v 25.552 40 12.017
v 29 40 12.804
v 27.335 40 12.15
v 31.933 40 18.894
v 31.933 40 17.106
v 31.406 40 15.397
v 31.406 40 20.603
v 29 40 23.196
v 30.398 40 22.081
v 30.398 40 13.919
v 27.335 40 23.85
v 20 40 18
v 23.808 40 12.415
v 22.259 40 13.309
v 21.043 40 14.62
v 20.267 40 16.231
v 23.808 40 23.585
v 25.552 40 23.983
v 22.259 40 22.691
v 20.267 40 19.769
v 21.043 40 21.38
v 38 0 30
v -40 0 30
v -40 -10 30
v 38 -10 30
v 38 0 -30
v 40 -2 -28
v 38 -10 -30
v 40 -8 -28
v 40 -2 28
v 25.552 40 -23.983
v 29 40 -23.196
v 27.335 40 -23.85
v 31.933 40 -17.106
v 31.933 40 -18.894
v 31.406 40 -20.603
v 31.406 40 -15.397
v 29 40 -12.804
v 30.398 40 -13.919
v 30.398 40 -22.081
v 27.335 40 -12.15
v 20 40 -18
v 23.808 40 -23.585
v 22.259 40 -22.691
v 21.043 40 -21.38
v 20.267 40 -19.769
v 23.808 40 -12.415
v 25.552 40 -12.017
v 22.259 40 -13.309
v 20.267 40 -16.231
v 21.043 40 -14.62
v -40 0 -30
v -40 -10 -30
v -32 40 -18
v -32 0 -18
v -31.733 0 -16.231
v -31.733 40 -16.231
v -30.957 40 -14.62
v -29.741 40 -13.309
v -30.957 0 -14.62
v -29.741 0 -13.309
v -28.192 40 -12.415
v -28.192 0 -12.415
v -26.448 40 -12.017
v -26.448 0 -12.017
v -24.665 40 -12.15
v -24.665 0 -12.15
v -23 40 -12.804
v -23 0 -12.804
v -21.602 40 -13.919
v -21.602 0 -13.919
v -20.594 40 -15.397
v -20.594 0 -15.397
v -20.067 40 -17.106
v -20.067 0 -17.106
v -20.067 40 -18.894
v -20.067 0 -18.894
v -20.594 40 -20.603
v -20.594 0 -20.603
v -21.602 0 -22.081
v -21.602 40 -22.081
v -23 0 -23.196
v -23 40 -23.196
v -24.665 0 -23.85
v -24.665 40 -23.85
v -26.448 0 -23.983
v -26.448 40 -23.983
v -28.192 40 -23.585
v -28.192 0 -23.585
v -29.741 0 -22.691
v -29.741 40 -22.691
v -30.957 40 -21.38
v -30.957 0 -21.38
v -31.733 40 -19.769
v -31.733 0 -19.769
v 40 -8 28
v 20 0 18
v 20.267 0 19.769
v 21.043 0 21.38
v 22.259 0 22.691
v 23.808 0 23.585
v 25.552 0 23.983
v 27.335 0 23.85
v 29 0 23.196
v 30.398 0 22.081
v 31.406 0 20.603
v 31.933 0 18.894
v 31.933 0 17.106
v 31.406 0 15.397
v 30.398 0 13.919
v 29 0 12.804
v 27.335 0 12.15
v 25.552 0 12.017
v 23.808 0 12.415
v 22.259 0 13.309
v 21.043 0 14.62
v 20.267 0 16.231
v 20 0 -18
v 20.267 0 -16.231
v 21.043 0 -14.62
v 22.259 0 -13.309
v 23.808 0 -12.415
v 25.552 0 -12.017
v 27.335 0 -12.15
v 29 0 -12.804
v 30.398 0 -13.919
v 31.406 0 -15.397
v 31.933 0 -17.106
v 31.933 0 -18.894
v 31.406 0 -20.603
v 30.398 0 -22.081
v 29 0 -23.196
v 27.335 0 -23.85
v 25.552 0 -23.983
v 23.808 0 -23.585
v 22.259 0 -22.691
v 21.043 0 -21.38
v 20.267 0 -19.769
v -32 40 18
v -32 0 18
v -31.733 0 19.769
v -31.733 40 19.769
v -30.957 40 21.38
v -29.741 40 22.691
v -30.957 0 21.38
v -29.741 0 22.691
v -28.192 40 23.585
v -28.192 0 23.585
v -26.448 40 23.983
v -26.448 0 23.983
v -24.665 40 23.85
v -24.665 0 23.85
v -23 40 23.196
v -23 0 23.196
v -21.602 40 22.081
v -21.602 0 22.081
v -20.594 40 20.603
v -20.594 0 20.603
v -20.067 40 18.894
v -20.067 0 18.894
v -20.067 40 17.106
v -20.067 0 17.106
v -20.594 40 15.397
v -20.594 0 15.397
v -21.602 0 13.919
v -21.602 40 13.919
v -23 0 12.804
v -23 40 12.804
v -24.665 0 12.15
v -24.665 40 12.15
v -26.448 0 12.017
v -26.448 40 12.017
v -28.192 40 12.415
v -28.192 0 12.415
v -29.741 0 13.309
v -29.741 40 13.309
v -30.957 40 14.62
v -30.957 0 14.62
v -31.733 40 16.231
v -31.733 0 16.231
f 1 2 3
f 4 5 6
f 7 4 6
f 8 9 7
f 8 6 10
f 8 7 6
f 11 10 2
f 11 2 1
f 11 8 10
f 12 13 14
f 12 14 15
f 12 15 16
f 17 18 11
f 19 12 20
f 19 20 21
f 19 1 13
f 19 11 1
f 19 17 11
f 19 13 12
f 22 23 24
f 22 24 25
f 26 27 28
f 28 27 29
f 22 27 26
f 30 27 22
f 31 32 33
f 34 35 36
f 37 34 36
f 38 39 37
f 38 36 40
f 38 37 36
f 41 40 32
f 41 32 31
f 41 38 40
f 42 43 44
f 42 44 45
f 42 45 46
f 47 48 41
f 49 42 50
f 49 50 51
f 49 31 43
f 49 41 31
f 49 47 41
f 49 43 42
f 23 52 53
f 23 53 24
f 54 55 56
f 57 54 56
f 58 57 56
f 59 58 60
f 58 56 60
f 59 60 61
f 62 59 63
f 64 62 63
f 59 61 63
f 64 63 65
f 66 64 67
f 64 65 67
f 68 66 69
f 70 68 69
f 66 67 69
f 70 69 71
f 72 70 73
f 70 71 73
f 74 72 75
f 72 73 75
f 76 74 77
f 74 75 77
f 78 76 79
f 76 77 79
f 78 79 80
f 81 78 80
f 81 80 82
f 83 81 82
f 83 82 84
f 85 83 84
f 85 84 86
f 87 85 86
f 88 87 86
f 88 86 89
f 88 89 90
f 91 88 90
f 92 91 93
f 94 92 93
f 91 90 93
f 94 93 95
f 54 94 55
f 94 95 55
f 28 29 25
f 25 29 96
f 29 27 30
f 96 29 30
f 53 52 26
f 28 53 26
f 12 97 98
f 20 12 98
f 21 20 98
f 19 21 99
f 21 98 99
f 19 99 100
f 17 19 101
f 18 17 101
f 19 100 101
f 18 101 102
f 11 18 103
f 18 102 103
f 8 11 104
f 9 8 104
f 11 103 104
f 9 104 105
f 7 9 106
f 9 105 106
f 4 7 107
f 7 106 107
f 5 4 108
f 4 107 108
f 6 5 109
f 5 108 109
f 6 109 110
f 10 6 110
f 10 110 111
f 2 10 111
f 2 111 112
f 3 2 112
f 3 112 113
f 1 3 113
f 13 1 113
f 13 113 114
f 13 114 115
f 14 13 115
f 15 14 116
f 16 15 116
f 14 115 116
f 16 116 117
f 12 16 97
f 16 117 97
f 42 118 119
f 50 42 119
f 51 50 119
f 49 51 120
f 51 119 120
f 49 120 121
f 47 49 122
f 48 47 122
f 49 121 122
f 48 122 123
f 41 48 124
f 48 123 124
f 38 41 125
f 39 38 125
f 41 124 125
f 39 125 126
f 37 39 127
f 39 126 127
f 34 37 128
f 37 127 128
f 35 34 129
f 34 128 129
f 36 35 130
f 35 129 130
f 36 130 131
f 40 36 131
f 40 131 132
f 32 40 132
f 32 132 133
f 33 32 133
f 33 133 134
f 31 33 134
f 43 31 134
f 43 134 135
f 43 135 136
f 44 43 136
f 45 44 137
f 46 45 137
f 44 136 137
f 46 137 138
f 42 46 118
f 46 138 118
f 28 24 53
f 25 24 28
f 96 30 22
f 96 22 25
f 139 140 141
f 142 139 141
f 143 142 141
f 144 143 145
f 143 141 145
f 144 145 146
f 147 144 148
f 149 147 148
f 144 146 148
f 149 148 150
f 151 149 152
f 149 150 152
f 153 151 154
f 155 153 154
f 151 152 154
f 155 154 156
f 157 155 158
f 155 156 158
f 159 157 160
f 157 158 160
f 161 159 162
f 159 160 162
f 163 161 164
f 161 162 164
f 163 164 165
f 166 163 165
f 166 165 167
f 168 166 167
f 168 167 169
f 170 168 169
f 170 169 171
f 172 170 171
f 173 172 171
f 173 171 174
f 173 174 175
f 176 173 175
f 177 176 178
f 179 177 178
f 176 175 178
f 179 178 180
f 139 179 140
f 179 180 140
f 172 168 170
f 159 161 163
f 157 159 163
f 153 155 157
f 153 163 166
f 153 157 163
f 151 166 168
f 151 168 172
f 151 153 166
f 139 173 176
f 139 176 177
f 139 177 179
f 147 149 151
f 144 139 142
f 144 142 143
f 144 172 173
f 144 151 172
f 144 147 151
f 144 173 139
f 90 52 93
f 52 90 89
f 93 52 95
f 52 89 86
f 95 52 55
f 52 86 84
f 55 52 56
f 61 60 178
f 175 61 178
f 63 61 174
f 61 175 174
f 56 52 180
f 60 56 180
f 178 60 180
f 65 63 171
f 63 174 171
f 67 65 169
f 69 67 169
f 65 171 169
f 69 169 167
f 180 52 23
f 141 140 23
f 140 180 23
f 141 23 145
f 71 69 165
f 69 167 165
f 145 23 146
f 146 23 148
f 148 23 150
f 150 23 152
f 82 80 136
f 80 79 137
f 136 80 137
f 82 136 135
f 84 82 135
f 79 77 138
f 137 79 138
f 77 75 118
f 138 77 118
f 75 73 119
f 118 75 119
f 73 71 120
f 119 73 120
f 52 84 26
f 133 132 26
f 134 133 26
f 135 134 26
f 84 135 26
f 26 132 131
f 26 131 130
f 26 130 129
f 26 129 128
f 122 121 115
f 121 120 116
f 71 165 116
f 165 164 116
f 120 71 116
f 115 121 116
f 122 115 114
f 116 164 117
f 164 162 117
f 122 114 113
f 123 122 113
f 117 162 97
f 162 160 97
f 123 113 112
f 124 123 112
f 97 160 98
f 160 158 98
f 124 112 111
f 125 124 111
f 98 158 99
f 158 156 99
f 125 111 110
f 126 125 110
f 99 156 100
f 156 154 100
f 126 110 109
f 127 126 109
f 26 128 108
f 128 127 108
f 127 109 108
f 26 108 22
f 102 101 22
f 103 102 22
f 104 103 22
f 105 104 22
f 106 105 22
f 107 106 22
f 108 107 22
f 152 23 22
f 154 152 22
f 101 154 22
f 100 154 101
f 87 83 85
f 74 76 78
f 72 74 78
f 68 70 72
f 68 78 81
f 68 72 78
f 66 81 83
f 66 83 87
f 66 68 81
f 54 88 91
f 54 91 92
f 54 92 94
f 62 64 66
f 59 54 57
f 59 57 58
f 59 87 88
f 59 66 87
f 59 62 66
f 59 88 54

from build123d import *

# Parameters (mm, degrees)
F0_W     = 80
F0_H     = 60
F1_DEPTH = 10
F2_R     = 6
F3_DEPTH = 40
F4_SIZE  = 2


with BuildPart() as f1:
    # F0 (on Front) → F1 (new body)
    with BuildSketch(Plane.XZ):
        Rectangle(F0_W, F0_H)
    extrude(amount=F1_DEPTH)

    # F2 (on face) → F3 (join)
    with BuildSketch(Plane(origin=(0, 0, 0), x_dir=(-1, 0, 0), z_dir=(0, 1, 0))):
        with Locations((26, 18)):
            Circle(F2_R)
        with Locations((26, -18)):
            Circle(F2_R)
        with Locations((-26, -18)):
            Circle(F2_R)
        with Locations((-26, 18)):
            Circle(F2_R)
    extrude(amount=F3_DEPTH)

    # F4
    f4_edges = [f1.edges().sort_by_distance(p)[0] for p in [
        (40, -5, -30),
        (40, -5, 30),
        (40, 0, 0),
        (40, -10, 0),
    ]]
    chamfer(f4_edges, length=F4_SIZE)


solid = f1.part
